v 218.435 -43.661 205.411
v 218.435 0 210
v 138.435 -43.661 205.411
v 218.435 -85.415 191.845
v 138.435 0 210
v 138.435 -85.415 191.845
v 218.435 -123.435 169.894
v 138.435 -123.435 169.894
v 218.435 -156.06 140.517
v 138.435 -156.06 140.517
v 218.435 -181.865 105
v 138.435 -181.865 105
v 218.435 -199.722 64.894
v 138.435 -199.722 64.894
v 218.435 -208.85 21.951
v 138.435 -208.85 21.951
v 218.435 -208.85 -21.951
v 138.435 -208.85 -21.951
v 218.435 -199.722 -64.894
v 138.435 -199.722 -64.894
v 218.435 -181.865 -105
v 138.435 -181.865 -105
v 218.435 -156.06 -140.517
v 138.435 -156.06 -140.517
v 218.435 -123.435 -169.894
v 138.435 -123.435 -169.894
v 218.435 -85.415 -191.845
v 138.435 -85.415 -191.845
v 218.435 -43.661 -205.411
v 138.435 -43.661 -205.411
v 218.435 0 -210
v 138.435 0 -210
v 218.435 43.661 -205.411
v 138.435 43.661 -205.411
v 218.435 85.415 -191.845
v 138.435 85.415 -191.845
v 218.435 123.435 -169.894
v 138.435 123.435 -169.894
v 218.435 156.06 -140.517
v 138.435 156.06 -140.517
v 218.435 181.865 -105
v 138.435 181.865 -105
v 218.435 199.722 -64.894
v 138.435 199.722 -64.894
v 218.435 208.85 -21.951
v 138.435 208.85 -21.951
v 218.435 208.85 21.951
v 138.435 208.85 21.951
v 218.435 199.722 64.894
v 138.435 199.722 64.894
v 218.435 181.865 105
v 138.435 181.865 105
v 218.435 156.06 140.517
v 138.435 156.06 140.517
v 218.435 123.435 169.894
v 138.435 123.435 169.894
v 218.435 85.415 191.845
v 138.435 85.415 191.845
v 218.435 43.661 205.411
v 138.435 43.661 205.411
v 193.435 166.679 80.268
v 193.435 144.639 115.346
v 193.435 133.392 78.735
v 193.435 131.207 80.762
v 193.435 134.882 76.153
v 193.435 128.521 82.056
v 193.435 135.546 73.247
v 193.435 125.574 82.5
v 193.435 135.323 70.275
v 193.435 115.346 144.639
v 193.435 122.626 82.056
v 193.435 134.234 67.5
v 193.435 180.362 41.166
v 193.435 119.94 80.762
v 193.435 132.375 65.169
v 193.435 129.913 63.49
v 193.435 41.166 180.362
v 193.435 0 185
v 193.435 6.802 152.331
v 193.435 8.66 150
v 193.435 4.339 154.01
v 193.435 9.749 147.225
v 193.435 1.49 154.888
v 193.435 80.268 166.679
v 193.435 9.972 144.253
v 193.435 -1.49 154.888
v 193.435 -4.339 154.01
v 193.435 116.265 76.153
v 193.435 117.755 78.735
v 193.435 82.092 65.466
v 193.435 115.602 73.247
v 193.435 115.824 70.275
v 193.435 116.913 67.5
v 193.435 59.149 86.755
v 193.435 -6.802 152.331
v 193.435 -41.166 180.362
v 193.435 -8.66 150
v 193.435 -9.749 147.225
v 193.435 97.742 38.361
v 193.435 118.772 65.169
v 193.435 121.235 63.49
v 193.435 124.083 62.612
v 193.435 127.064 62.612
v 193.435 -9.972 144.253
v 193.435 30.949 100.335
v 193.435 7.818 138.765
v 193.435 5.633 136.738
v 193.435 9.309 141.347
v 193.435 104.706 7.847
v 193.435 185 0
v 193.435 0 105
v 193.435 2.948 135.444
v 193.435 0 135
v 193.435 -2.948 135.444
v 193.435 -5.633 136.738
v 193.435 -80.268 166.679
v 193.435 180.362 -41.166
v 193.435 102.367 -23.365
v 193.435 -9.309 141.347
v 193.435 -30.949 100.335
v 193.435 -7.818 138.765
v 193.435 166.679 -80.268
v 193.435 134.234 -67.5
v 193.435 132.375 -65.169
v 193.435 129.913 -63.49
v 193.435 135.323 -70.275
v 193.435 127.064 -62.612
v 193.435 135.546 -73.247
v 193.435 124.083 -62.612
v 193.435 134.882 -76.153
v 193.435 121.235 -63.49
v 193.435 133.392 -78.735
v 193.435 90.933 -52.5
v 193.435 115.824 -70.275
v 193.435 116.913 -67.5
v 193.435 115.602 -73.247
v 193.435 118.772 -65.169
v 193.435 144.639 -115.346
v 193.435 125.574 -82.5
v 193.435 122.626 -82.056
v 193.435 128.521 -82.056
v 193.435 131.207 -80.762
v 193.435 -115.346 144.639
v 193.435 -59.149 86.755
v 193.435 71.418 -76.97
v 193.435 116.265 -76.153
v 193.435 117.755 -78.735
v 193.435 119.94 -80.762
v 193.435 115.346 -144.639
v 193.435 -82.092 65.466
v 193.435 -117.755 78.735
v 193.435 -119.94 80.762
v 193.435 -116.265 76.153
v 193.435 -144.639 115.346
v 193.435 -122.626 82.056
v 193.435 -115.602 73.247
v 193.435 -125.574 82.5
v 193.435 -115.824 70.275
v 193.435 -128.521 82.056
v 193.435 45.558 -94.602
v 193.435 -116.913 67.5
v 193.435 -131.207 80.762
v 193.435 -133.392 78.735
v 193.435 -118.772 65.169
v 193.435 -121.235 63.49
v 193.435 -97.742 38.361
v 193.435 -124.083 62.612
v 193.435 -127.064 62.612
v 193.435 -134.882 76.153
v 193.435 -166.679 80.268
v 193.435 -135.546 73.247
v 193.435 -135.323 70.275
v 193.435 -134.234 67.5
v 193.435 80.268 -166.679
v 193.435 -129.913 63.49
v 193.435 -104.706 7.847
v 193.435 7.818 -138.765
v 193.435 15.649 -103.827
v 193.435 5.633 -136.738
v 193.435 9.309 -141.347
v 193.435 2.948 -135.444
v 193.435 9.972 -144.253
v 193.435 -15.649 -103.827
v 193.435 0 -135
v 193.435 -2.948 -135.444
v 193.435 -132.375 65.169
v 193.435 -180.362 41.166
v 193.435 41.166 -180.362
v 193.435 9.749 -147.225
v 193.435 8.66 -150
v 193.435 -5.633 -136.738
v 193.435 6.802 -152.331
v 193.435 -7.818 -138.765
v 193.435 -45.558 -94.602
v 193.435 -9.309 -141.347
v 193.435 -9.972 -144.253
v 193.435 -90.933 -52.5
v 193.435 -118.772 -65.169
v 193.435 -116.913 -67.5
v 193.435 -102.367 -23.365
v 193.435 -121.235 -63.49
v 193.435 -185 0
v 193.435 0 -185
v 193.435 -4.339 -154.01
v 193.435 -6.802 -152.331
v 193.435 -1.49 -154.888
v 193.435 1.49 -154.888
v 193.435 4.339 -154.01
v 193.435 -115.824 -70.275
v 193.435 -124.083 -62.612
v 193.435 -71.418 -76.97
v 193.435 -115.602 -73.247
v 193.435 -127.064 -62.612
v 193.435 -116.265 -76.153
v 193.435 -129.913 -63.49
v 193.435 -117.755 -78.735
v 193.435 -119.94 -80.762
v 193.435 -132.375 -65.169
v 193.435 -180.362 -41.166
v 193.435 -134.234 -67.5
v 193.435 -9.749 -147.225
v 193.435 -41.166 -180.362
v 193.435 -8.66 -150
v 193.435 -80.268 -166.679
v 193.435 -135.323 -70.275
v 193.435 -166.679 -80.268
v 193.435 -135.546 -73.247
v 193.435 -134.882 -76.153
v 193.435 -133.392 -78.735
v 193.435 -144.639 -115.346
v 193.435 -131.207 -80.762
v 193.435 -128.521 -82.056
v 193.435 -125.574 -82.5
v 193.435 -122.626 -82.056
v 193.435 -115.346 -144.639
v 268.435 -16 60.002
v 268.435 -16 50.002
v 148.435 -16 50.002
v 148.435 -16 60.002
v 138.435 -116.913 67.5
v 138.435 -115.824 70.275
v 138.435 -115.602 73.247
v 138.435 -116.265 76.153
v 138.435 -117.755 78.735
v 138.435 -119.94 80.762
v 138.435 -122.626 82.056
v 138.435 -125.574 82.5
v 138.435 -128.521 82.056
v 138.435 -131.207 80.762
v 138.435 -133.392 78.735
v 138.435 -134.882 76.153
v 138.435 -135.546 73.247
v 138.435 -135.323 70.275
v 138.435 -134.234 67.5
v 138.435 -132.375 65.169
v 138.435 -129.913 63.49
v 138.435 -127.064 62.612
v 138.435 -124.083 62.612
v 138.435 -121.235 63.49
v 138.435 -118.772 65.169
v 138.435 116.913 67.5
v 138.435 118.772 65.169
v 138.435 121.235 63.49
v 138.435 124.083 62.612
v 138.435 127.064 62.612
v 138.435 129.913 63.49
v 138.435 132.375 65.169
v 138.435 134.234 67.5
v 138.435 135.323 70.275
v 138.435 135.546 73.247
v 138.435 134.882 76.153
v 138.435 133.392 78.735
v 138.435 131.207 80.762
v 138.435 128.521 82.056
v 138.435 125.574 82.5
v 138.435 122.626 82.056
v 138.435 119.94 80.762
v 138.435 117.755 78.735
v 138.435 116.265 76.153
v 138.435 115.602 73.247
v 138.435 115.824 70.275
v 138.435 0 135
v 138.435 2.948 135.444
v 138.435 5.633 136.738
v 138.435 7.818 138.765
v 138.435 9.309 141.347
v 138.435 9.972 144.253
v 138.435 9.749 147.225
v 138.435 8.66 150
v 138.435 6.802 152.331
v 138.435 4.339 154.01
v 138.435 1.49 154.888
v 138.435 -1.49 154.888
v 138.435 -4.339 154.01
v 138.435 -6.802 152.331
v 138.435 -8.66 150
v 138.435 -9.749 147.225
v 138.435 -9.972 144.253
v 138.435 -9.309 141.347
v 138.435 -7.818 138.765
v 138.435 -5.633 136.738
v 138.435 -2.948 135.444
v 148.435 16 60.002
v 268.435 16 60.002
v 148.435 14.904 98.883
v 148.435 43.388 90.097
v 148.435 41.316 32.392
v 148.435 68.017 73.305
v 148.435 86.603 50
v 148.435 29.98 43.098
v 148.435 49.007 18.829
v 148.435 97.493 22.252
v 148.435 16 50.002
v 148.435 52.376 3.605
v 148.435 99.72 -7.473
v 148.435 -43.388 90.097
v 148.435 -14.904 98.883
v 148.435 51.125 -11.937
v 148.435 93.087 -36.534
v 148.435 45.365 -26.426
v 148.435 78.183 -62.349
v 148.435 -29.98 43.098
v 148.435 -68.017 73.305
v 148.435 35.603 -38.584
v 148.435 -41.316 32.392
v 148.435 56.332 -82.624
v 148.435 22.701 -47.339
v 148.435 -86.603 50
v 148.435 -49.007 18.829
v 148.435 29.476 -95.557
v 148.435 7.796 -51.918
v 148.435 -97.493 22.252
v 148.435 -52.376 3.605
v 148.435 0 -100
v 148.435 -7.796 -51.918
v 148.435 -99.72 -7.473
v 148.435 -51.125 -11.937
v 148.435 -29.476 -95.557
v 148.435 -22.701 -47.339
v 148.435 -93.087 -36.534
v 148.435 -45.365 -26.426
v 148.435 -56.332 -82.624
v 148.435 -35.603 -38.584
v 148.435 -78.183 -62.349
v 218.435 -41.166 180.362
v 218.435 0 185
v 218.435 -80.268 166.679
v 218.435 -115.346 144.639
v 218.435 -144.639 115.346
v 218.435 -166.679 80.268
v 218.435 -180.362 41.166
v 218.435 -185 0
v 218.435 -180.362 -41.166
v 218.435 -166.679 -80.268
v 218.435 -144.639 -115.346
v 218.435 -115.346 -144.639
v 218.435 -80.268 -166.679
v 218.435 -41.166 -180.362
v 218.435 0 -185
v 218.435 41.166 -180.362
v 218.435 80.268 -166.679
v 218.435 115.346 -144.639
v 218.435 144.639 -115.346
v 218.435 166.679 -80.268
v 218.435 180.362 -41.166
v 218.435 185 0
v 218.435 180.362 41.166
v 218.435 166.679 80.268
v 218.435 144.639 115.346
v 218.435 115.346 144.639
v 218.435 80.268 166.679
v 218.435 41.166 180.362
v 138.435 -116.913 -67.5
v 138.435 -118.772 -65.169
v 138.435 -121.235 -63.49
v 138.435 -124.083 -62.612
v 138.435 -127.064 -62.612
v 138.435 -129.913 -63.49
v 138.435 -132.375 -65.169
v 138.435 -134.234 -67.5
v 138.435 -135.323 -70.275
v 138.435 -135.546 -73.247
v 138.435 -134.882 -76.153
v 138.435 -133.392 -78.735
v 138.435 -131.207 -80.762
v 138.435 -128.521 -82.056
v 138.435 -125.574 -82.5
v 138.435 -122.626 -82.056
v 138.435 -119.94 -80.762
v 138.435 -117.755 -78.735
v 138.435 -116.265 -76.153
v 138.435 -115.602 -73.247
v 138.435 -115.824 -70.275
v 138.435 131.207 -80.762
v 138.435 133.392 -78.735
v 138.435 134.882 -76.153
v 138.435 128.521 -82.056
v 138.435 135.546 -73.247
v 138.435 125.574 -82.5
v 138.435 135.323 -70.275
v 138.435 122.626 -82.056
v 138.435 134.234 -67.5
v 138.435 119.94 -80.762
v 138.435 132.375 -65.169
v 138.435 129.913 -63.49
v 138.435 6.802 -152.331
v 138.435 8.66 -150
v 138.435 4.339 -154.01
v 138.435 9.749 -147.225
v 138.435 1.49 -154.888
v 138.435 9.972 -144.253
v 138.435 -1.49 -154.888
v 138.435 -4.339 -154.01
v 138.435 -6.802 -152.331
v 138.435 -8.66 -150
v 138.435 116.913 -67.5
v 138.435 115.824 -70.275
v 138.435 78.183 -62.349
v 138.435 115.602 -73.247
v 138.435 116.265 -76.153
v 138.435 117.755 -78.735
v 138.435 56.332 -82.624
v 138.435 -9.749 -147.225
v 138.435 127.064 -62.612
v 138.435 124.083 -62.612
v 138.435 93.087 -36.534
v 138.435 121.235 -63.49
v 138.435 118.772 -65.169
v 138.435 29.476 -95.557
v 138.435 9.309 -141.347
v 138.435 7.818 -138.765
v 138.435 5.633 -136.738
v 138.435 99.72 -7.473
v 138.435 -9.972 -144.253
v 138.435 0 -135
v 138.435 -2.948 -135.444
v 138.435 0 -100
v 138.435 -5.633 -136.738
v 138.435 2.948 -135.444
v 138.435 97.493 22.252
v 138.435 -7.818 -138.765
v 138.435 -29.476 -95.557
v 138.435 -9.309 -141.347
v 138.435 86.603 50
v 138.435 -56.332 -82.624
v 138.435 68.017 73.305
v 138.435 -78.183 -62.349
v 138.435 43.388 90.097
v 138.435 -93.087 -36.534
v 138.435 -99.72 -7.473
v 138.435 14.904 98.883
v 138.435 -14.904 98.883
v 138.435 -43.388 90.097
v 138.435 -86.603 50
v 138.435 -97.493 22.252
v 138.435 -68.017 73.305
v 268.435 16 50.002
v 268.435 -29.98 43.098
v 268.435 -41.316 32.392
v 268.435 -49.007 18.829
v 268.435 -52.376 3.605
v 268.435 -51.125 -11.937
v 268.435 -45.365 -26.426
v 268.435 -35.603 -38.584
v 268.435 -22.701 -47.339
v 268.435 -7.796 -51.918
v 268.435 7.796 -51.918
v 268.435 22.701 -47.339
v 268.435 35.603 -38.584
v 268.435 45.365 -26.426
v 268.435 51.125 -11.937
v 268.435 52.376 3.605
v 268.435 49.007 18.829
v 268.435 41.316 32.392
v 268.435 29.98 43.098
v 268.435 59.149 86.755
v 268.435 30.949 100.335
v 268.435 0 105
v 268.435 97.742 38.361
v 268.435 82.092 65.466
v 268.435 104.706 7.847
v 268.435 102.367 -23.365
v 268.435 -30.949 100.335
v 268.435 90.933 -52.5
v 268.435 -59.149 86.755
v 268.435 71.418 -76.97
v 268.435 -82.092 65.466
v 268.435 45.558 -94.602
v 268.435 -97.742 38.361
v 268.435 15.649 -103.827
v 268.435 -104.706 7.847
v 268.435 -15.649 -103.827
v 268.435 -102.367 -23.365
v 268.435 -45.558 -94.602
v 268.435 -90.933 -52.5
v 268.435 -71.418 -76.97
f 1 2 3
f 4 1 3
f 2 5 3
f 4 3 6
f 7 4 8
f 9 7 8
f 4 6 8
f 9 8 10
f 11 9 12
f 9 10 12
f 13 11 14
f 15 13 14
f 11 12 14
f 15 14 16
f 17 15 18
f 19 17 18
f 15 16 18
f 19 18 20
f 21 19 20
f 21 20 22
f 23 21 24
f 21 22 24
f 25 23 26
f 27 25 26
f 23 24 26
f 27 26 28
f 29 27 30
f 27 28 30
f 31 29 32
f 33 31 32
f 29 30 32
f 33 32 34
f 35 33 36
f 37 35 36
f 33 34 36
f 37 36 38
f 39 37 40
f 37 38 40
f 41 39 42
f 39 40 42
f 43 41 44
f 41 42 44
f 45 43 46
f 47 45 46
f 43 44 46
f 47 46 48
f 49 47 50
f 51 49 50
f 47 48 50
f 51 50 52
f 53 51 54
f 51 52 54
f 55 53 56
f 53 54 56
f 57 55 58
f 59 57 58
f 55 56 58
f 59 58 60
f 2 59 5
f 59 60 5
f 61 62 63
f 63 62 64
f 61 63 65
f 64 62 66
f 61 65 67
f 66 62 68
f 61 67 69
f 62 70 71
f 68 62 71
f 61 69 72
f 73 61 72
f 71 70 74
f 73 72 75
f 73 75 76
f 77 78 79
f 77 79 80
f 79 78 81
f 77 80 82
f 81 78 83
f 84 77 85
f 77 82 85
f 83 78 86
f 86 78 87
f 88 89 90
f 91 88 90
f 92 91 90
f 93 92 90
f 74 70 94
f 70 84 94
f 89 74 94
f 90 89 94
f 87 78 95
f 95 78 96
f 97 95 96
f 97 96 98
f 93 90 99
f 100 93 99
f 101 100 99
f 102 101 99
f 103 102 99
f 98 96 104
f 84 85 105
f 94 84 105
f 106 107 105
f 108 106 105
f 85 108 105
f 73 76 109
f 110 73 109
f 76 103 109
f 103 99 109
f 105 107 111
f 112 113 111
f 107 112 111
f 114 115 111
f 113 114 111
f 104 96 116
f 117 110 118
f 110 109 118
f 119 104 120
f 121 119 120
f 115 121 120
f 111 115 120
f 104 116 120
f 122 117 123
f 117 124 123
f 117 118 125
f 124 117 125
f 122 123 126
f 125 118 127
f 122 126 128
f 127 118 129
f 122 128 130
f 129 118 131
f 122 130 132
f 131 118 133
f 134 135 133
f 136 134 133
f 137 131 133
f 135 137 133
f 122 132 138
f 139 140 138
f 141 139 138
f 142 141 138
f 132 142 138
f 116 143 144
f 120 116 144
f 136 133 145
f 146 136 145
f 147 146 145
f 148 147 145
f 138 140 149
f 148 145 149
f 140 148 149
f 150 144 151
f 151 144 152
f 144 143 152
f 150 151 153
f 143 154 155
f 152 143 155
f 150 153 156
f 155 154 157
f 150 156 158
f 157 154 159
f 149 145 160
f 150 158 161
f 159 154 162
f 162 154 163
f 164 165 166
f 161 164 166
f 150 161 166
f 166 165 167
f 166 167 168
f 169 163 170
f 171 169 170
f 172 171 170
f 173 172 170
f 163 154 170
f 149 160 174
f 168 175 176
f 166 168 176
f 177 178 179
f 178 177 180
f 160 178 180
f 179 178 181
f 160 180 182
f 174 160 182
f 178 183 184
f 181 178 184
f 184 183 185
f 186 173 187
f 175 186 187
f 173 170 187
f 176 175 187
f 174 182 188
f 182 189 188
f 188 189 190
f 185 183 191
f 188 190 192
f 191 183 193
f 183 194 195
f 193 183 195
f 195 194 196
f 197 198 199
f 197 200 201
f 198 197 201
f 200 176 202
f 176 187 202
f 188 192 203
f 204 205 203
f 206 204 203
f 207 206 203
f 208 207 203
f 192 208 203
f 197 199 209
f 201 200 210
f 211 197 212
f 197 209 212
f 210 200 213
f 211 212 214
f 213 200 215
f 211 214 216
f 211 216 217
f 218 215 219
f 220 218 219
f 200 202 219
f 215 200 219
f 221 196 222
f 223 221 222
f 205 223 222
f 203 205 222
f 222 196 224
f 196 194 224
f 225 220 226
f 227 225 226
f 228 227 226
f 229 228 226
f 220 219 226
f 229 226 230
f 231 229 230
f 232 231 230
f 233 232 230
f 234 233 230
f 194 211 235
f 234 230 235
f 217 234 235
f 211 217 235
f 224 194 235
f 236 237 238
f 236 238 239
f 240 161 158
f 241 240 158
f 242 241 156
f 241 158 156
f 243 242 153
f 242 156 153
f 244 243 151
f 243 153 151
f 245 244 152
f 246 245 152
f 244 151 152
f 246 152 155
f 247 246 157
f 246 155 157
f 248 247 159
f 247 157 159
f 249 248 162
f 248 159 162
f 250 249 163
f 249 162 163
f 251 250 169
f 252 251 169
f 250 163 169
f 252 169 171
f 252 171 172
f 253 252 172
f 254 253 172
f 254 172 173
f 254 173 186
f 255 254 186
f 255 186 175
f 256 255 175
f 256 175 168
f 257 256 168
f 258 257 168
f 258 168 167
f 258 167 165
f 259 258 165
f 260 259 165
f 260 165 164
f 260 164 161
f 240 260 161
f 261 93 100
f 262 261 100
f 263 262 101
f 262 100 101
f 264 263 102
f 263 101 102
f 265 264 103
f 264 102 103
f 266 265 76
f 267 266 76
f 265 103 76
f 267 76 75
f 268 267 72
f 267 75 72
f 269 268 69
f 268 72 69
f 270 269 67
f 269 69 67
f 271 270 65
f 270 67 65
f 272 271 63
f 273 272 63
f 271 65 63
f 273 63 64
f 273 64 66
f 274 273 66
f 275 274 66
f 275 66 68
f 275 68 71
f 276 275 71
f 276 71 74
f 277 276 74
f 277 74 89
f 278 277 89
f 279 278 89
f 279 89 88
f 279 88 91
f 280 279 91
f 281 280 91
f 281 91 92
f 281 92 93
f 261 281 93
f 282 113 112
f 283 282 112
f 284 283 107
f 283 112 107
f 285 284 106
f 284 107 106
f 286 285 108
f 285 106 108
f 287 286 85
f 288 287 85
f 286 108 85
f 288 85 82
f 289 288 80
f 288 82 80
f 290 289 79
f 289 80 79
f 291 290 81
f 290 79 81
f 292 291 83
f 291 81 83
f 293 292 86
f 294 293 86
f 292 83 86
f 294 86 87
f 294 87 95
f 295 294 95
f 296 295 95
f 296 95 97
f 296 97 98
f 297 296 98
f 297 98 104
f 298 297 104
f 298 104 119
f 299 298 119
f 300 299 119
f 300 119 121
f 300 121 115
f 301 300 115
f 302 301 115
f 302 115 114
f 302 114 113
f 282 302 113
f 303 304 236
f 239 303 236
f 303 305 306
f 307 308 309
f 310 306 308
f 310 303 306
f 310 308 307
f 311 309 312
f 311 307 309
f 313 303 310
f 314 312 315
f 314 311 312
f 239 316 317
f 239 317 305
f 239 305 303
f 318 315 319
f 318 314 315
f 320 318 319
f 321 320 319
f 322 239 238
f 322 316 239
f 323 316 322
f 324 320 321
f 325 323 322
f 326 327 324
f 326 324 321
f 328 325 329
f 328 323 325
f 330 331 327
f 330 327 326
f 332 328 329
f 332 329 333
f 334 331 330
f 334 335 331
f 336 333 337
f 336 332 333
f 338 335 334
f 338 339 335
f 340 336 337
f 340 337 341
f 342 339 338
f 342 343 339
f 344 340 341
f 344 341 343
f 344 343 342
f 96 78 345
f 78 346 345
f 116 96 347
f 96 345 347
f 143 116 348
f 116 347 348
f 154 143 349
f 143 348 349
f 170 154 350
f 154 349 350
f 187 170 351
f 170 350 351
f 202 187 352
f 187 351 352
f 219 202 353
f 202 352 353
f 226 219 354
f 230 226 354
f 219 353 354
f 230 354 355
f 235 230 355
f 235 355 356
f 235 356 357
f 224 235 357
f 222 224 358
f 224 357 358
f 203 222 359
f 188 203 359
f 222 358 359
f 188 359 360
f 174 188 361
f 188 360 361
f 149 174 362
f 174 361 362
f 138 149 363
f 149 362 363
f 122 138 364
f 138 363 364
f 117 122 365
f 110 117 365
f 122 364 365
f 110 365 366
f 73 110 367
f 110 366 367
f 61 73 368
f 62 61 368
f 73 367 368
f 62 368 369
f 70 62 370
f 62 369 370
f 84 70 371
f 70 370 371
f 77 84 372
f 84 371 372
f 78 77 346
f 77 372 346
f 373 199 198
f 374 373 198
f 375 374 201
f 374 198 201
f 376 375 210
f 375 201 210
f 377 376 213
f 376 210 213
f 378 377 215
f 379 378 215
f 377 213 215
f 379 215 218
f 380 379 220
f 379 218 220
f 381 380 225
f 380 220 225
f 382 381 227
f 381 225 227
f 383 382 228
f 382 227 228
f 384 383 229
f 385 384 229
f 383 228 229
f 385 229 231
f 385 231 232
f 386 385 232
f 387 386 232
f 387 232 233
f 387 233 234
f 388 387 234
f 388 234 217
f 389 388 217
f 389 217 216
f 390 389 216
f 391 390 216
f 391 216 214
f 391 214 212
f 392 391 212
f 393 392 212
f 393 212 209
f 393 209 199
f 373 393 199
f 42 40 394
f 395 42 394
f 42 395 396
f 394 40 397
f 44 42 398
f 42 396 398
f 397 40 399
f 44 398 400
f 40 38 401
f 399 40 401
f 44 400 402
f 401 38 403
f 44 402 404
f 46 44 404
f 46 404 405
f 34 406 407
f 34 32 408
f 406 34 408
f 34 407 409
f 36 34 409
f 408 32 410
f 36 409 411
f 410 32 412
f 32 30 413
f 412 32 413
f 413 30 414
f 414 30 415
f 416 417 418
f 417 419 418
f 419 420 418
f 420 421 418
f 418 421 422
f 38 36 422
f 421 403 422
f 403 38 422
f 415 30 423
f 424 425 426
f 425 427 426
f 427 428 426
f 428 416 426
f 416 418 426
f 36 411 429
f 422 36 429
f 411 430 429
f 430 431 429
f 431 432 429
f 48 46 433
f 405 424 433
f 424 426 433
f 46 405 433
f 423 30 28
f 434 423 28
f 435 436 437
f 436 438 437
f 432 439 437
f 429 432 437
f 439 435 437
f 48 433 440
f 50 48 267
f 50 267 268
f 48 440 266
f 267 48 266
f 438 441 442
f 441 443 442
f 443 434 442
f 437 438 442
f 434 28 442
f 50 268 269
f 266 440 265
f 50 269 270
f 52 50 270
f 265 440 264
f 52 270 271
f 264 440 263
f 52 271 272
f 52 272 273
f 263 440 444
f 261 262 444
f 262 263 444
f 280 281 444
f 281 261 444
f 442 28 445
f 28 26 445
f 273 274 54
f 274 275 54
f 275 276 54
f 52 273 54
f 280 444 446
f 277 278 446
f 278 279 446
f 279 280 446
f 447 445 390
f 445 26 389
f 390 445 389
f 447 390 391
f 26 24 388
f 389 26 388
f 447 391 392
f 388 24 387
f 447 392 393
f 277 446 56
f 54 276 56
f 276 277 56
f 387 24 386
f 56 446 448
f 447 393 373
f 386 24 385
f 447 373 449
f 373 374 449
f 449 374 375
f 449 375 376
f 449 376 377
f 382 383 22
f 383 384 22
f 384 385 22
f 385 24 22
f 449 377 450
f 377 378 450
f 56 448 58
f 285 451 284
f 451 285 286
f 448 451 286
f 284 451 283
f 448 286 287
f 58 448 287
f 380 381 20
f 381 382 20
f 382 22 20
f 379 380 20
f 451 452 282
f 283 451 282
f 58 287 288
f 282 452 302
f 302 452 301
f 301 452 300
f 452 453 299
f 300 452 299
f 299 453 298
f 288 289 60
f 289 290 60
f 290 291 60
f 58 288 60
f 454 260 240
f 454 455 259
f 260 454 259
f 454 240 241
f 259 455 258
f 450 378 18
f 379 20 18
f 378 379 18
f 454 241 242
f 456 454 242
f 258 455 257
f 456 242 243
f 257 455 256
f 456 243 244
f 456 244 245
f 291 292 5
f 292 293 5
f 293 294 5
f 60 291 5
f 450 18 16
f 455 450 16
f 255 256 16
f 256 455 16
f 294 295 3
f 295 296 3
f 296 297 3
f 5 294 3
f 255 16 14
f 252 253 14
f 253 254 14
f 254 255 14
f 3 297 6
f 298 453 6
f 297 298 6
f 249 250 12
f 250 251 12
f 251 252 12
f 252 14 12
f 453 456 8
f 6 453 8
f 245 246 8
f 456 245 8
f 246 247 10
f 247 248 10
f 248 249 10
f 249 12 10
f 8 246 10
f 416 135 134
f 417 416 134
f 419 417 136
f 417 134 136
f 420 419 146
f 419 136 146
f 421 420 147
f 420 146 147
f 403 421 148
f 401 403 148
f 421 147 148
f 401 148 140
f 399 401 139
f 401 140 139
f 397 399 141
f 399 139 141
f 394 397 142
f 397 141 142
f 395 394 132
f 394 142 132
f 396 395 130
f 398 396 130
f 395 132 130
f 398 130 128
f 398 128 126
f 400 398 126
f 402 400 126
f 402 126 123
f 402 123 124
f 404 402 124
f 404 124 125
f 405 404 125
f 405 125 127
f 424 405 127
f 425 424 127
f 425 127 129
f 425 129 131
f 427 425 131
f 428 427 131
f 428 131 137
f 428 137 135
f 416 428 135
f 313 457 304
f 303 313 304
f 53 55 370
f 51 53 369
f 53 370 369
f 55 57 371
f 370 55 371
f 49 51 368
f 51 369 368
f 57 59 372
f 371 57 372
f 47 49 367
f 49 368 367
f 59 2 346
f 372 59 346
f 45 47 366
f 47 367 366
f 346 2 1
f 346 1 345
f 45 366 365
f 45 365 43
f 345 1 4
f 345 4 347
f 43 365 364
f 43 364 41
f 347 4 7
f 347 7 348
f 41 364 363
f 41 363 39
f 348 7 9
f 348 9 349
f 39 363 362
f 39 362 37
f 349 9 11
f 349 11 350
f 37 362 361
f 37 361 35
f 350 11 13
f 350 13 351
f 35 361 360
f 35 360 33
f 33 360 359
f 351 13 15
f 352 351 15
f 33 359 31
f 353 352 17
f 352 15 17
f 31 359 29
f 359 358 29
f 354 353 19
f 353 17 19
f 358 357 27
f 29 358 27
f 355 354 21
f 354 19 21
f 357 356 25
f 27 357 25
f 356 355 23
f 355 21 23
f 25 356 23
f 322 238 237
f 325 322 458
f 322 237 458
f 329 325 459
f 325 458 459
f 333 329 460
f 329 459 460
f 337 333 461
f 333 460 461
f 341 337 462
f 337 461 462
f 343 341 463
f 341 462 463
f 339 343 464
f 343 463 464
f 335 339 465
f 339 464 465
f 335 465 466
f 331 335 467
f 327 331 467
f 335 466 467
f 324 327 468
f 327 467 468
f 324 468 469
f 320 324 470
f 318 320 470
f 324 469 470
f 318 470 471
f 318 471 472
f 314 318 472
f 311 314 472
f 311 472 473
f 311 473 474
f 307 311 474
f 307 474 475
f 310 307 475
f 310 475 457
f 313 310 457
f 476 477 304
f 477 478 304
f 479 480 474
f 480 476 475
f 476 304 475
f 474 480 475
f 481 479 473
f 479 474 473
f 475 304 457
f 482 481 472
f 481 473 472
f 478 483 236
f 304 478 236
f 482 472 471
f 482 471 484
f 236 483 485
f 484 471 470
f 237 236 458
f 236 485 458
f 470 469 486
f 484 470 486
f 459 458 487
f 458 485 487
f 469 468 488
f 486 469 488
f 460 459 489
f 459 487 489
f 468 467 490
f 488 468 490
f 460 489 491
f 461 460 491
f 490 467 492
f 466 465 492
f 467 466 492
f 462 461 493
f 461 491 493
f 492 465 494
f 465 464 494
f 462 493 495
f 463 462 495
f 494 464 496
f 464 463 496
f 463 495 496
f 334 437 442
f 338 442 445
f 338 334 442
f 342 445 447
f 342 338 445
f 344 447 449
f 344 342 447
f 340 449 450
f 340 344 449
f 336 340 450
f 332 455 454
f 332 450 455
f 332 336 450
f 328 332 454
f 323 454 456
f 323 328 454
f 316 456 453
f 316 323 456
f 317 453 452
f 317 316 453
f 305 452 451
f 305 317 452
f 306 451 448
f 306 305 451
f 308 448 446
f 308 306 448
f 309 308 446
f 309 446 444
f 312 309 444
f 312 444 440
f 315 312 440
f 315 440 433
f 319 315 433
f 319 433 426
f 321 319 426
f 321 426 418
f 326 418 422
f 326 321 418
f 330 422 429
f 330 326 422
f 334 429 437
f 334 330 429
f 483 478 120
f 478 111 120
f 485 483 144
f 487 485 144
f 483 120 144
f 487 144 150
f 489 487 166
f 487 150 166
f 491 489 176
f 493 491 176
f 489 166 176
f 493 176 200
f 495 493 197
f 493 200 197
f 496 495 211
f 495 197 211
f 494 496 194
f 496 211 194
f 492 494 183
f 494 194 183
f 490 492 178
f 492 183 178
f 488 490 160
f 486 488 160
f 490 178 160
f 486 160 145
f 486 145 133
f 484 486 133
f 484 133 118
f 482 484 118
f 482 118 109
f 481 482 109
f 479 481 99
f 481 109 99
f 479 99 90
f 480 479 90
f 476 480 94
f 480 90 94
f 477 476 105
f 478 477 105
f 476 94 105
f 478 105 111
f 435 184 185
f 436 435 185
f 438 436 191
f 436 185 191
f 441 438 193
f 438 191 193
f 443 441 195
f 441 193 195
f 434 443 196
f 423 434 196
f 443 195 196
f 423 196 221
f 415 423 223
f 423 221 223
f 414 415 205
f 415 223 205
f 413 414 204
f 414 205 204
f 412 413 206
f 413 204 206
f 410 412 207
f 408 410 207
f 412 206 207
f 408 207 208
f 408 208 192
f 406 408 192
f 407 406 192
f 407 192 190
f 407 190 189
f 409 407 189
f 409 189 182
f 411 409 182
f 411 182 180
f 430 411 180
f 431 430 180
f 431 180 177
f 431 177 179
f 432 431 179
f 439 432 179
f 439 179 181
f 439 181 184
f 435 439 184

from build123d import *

# Parameters (mm, degrees)
SKETCH3_R               = 10
CUT_EXTRUDE1_DEPTH      = 307.30866785
CIRPATTERN1_COUNT       = 6
CUT_EXTRUDE2_DEPTH      = 325.191301549
CUT_EXTRUDE2_DEPTH_BACK = 325.191301549
SKETCH4_W               = 32
SKETCH4_H               = 10
CUT_EXTRUDE3_DEPTH      = 325.191301549
CUT_EXTRUDE3_DEPTH_BACK = 10
SKETCH5_R               = 100


with BuildPart() as part:
    # Sketch2 → Revolve1 (revolve)
    with BuildSketch(Plane(origin=(0, 0, 0), x_dir=(-1, 0, 0), z_dir=(0, 1, 0))):
        Polygon((-138.434782609, 52.5), (-268.434782609, 52.5), (-268.434782609, 105), (-193.434782609, 105), (-193.434782609, 185), (-218.434782609, 185), (-218.434782609, 210), (-138.434782609, 210), align=None)
    revolve(axis=Axis((0, 0, 0), (1, 0, 0)))

    # Sketch3 → Cut-Extrude1 (cut, through all)
    with BuildSketch(Plane.YZ.offset(193.434782609)):
        with Locations(Location((0, 145, 0), (0, 0, 270))):
            Circle(SKETCH3_R)
    cut_extrude1 = extrude(amount=-CUT_EXTRUDE1_DEPTH, mode=Mode.SUBTRACT)

    # CirPattern1: Cut-Extrude1 ×6 about axis
    cirpattern1_axis = Axis((0, 0, 0), (1, 0, 0))
    for i in range(1, CIRPATTERN1_COUNT):
        add(cut_extrude1.rotate(cirpattern1_axis, i * 360 / CIRPATTERN1_COUNT), mode=Mode.SUBTRACT)

    # Sketch4 → Cut-Extrude2 (cut, two sides: drawn at the far end of the back side and taken through both)
    with BuildSketch(Plane(origin=(138.434782609, 0, 0), x_dir=(0, -1, 0), z_dir=(-1, 0, 0)).offset(-CUT_EXTRUDE2_DEPTH_BACK)):
        with Locations((0, 55.002499938)):
            Rectangle(SKETCH4_W, SKETCH4_H)
    extrude(amount=CUT_EXTRUDE2_DEPTH + CUT_EXTRUDE2_DEPTH_BACK, mode=Mode.SUBTRACT)

    # Sketch5 → Cut-Extrude3 (cut, two sides: drawn at the far end of the back side and taken through both)
    with BuildSketch(Plane(origin=(138.434782609, 0, 0), x_dir=(0, -1, 0), z_dir=(-1, 0, 0)).offset(-CUT_EXTRUDE3_DEPTH_BACK)):
        with Locations(Location((0, 0, 0), (0, 0, 270))):
            Circle(SKETCH5_R)
    extrude(amount=CUT_EXTRUDE3_DEPTH + CUT_EXTRUDE3_DEPTH_BACK, mode=Mode.SUBTRACT)


solid = part.part
